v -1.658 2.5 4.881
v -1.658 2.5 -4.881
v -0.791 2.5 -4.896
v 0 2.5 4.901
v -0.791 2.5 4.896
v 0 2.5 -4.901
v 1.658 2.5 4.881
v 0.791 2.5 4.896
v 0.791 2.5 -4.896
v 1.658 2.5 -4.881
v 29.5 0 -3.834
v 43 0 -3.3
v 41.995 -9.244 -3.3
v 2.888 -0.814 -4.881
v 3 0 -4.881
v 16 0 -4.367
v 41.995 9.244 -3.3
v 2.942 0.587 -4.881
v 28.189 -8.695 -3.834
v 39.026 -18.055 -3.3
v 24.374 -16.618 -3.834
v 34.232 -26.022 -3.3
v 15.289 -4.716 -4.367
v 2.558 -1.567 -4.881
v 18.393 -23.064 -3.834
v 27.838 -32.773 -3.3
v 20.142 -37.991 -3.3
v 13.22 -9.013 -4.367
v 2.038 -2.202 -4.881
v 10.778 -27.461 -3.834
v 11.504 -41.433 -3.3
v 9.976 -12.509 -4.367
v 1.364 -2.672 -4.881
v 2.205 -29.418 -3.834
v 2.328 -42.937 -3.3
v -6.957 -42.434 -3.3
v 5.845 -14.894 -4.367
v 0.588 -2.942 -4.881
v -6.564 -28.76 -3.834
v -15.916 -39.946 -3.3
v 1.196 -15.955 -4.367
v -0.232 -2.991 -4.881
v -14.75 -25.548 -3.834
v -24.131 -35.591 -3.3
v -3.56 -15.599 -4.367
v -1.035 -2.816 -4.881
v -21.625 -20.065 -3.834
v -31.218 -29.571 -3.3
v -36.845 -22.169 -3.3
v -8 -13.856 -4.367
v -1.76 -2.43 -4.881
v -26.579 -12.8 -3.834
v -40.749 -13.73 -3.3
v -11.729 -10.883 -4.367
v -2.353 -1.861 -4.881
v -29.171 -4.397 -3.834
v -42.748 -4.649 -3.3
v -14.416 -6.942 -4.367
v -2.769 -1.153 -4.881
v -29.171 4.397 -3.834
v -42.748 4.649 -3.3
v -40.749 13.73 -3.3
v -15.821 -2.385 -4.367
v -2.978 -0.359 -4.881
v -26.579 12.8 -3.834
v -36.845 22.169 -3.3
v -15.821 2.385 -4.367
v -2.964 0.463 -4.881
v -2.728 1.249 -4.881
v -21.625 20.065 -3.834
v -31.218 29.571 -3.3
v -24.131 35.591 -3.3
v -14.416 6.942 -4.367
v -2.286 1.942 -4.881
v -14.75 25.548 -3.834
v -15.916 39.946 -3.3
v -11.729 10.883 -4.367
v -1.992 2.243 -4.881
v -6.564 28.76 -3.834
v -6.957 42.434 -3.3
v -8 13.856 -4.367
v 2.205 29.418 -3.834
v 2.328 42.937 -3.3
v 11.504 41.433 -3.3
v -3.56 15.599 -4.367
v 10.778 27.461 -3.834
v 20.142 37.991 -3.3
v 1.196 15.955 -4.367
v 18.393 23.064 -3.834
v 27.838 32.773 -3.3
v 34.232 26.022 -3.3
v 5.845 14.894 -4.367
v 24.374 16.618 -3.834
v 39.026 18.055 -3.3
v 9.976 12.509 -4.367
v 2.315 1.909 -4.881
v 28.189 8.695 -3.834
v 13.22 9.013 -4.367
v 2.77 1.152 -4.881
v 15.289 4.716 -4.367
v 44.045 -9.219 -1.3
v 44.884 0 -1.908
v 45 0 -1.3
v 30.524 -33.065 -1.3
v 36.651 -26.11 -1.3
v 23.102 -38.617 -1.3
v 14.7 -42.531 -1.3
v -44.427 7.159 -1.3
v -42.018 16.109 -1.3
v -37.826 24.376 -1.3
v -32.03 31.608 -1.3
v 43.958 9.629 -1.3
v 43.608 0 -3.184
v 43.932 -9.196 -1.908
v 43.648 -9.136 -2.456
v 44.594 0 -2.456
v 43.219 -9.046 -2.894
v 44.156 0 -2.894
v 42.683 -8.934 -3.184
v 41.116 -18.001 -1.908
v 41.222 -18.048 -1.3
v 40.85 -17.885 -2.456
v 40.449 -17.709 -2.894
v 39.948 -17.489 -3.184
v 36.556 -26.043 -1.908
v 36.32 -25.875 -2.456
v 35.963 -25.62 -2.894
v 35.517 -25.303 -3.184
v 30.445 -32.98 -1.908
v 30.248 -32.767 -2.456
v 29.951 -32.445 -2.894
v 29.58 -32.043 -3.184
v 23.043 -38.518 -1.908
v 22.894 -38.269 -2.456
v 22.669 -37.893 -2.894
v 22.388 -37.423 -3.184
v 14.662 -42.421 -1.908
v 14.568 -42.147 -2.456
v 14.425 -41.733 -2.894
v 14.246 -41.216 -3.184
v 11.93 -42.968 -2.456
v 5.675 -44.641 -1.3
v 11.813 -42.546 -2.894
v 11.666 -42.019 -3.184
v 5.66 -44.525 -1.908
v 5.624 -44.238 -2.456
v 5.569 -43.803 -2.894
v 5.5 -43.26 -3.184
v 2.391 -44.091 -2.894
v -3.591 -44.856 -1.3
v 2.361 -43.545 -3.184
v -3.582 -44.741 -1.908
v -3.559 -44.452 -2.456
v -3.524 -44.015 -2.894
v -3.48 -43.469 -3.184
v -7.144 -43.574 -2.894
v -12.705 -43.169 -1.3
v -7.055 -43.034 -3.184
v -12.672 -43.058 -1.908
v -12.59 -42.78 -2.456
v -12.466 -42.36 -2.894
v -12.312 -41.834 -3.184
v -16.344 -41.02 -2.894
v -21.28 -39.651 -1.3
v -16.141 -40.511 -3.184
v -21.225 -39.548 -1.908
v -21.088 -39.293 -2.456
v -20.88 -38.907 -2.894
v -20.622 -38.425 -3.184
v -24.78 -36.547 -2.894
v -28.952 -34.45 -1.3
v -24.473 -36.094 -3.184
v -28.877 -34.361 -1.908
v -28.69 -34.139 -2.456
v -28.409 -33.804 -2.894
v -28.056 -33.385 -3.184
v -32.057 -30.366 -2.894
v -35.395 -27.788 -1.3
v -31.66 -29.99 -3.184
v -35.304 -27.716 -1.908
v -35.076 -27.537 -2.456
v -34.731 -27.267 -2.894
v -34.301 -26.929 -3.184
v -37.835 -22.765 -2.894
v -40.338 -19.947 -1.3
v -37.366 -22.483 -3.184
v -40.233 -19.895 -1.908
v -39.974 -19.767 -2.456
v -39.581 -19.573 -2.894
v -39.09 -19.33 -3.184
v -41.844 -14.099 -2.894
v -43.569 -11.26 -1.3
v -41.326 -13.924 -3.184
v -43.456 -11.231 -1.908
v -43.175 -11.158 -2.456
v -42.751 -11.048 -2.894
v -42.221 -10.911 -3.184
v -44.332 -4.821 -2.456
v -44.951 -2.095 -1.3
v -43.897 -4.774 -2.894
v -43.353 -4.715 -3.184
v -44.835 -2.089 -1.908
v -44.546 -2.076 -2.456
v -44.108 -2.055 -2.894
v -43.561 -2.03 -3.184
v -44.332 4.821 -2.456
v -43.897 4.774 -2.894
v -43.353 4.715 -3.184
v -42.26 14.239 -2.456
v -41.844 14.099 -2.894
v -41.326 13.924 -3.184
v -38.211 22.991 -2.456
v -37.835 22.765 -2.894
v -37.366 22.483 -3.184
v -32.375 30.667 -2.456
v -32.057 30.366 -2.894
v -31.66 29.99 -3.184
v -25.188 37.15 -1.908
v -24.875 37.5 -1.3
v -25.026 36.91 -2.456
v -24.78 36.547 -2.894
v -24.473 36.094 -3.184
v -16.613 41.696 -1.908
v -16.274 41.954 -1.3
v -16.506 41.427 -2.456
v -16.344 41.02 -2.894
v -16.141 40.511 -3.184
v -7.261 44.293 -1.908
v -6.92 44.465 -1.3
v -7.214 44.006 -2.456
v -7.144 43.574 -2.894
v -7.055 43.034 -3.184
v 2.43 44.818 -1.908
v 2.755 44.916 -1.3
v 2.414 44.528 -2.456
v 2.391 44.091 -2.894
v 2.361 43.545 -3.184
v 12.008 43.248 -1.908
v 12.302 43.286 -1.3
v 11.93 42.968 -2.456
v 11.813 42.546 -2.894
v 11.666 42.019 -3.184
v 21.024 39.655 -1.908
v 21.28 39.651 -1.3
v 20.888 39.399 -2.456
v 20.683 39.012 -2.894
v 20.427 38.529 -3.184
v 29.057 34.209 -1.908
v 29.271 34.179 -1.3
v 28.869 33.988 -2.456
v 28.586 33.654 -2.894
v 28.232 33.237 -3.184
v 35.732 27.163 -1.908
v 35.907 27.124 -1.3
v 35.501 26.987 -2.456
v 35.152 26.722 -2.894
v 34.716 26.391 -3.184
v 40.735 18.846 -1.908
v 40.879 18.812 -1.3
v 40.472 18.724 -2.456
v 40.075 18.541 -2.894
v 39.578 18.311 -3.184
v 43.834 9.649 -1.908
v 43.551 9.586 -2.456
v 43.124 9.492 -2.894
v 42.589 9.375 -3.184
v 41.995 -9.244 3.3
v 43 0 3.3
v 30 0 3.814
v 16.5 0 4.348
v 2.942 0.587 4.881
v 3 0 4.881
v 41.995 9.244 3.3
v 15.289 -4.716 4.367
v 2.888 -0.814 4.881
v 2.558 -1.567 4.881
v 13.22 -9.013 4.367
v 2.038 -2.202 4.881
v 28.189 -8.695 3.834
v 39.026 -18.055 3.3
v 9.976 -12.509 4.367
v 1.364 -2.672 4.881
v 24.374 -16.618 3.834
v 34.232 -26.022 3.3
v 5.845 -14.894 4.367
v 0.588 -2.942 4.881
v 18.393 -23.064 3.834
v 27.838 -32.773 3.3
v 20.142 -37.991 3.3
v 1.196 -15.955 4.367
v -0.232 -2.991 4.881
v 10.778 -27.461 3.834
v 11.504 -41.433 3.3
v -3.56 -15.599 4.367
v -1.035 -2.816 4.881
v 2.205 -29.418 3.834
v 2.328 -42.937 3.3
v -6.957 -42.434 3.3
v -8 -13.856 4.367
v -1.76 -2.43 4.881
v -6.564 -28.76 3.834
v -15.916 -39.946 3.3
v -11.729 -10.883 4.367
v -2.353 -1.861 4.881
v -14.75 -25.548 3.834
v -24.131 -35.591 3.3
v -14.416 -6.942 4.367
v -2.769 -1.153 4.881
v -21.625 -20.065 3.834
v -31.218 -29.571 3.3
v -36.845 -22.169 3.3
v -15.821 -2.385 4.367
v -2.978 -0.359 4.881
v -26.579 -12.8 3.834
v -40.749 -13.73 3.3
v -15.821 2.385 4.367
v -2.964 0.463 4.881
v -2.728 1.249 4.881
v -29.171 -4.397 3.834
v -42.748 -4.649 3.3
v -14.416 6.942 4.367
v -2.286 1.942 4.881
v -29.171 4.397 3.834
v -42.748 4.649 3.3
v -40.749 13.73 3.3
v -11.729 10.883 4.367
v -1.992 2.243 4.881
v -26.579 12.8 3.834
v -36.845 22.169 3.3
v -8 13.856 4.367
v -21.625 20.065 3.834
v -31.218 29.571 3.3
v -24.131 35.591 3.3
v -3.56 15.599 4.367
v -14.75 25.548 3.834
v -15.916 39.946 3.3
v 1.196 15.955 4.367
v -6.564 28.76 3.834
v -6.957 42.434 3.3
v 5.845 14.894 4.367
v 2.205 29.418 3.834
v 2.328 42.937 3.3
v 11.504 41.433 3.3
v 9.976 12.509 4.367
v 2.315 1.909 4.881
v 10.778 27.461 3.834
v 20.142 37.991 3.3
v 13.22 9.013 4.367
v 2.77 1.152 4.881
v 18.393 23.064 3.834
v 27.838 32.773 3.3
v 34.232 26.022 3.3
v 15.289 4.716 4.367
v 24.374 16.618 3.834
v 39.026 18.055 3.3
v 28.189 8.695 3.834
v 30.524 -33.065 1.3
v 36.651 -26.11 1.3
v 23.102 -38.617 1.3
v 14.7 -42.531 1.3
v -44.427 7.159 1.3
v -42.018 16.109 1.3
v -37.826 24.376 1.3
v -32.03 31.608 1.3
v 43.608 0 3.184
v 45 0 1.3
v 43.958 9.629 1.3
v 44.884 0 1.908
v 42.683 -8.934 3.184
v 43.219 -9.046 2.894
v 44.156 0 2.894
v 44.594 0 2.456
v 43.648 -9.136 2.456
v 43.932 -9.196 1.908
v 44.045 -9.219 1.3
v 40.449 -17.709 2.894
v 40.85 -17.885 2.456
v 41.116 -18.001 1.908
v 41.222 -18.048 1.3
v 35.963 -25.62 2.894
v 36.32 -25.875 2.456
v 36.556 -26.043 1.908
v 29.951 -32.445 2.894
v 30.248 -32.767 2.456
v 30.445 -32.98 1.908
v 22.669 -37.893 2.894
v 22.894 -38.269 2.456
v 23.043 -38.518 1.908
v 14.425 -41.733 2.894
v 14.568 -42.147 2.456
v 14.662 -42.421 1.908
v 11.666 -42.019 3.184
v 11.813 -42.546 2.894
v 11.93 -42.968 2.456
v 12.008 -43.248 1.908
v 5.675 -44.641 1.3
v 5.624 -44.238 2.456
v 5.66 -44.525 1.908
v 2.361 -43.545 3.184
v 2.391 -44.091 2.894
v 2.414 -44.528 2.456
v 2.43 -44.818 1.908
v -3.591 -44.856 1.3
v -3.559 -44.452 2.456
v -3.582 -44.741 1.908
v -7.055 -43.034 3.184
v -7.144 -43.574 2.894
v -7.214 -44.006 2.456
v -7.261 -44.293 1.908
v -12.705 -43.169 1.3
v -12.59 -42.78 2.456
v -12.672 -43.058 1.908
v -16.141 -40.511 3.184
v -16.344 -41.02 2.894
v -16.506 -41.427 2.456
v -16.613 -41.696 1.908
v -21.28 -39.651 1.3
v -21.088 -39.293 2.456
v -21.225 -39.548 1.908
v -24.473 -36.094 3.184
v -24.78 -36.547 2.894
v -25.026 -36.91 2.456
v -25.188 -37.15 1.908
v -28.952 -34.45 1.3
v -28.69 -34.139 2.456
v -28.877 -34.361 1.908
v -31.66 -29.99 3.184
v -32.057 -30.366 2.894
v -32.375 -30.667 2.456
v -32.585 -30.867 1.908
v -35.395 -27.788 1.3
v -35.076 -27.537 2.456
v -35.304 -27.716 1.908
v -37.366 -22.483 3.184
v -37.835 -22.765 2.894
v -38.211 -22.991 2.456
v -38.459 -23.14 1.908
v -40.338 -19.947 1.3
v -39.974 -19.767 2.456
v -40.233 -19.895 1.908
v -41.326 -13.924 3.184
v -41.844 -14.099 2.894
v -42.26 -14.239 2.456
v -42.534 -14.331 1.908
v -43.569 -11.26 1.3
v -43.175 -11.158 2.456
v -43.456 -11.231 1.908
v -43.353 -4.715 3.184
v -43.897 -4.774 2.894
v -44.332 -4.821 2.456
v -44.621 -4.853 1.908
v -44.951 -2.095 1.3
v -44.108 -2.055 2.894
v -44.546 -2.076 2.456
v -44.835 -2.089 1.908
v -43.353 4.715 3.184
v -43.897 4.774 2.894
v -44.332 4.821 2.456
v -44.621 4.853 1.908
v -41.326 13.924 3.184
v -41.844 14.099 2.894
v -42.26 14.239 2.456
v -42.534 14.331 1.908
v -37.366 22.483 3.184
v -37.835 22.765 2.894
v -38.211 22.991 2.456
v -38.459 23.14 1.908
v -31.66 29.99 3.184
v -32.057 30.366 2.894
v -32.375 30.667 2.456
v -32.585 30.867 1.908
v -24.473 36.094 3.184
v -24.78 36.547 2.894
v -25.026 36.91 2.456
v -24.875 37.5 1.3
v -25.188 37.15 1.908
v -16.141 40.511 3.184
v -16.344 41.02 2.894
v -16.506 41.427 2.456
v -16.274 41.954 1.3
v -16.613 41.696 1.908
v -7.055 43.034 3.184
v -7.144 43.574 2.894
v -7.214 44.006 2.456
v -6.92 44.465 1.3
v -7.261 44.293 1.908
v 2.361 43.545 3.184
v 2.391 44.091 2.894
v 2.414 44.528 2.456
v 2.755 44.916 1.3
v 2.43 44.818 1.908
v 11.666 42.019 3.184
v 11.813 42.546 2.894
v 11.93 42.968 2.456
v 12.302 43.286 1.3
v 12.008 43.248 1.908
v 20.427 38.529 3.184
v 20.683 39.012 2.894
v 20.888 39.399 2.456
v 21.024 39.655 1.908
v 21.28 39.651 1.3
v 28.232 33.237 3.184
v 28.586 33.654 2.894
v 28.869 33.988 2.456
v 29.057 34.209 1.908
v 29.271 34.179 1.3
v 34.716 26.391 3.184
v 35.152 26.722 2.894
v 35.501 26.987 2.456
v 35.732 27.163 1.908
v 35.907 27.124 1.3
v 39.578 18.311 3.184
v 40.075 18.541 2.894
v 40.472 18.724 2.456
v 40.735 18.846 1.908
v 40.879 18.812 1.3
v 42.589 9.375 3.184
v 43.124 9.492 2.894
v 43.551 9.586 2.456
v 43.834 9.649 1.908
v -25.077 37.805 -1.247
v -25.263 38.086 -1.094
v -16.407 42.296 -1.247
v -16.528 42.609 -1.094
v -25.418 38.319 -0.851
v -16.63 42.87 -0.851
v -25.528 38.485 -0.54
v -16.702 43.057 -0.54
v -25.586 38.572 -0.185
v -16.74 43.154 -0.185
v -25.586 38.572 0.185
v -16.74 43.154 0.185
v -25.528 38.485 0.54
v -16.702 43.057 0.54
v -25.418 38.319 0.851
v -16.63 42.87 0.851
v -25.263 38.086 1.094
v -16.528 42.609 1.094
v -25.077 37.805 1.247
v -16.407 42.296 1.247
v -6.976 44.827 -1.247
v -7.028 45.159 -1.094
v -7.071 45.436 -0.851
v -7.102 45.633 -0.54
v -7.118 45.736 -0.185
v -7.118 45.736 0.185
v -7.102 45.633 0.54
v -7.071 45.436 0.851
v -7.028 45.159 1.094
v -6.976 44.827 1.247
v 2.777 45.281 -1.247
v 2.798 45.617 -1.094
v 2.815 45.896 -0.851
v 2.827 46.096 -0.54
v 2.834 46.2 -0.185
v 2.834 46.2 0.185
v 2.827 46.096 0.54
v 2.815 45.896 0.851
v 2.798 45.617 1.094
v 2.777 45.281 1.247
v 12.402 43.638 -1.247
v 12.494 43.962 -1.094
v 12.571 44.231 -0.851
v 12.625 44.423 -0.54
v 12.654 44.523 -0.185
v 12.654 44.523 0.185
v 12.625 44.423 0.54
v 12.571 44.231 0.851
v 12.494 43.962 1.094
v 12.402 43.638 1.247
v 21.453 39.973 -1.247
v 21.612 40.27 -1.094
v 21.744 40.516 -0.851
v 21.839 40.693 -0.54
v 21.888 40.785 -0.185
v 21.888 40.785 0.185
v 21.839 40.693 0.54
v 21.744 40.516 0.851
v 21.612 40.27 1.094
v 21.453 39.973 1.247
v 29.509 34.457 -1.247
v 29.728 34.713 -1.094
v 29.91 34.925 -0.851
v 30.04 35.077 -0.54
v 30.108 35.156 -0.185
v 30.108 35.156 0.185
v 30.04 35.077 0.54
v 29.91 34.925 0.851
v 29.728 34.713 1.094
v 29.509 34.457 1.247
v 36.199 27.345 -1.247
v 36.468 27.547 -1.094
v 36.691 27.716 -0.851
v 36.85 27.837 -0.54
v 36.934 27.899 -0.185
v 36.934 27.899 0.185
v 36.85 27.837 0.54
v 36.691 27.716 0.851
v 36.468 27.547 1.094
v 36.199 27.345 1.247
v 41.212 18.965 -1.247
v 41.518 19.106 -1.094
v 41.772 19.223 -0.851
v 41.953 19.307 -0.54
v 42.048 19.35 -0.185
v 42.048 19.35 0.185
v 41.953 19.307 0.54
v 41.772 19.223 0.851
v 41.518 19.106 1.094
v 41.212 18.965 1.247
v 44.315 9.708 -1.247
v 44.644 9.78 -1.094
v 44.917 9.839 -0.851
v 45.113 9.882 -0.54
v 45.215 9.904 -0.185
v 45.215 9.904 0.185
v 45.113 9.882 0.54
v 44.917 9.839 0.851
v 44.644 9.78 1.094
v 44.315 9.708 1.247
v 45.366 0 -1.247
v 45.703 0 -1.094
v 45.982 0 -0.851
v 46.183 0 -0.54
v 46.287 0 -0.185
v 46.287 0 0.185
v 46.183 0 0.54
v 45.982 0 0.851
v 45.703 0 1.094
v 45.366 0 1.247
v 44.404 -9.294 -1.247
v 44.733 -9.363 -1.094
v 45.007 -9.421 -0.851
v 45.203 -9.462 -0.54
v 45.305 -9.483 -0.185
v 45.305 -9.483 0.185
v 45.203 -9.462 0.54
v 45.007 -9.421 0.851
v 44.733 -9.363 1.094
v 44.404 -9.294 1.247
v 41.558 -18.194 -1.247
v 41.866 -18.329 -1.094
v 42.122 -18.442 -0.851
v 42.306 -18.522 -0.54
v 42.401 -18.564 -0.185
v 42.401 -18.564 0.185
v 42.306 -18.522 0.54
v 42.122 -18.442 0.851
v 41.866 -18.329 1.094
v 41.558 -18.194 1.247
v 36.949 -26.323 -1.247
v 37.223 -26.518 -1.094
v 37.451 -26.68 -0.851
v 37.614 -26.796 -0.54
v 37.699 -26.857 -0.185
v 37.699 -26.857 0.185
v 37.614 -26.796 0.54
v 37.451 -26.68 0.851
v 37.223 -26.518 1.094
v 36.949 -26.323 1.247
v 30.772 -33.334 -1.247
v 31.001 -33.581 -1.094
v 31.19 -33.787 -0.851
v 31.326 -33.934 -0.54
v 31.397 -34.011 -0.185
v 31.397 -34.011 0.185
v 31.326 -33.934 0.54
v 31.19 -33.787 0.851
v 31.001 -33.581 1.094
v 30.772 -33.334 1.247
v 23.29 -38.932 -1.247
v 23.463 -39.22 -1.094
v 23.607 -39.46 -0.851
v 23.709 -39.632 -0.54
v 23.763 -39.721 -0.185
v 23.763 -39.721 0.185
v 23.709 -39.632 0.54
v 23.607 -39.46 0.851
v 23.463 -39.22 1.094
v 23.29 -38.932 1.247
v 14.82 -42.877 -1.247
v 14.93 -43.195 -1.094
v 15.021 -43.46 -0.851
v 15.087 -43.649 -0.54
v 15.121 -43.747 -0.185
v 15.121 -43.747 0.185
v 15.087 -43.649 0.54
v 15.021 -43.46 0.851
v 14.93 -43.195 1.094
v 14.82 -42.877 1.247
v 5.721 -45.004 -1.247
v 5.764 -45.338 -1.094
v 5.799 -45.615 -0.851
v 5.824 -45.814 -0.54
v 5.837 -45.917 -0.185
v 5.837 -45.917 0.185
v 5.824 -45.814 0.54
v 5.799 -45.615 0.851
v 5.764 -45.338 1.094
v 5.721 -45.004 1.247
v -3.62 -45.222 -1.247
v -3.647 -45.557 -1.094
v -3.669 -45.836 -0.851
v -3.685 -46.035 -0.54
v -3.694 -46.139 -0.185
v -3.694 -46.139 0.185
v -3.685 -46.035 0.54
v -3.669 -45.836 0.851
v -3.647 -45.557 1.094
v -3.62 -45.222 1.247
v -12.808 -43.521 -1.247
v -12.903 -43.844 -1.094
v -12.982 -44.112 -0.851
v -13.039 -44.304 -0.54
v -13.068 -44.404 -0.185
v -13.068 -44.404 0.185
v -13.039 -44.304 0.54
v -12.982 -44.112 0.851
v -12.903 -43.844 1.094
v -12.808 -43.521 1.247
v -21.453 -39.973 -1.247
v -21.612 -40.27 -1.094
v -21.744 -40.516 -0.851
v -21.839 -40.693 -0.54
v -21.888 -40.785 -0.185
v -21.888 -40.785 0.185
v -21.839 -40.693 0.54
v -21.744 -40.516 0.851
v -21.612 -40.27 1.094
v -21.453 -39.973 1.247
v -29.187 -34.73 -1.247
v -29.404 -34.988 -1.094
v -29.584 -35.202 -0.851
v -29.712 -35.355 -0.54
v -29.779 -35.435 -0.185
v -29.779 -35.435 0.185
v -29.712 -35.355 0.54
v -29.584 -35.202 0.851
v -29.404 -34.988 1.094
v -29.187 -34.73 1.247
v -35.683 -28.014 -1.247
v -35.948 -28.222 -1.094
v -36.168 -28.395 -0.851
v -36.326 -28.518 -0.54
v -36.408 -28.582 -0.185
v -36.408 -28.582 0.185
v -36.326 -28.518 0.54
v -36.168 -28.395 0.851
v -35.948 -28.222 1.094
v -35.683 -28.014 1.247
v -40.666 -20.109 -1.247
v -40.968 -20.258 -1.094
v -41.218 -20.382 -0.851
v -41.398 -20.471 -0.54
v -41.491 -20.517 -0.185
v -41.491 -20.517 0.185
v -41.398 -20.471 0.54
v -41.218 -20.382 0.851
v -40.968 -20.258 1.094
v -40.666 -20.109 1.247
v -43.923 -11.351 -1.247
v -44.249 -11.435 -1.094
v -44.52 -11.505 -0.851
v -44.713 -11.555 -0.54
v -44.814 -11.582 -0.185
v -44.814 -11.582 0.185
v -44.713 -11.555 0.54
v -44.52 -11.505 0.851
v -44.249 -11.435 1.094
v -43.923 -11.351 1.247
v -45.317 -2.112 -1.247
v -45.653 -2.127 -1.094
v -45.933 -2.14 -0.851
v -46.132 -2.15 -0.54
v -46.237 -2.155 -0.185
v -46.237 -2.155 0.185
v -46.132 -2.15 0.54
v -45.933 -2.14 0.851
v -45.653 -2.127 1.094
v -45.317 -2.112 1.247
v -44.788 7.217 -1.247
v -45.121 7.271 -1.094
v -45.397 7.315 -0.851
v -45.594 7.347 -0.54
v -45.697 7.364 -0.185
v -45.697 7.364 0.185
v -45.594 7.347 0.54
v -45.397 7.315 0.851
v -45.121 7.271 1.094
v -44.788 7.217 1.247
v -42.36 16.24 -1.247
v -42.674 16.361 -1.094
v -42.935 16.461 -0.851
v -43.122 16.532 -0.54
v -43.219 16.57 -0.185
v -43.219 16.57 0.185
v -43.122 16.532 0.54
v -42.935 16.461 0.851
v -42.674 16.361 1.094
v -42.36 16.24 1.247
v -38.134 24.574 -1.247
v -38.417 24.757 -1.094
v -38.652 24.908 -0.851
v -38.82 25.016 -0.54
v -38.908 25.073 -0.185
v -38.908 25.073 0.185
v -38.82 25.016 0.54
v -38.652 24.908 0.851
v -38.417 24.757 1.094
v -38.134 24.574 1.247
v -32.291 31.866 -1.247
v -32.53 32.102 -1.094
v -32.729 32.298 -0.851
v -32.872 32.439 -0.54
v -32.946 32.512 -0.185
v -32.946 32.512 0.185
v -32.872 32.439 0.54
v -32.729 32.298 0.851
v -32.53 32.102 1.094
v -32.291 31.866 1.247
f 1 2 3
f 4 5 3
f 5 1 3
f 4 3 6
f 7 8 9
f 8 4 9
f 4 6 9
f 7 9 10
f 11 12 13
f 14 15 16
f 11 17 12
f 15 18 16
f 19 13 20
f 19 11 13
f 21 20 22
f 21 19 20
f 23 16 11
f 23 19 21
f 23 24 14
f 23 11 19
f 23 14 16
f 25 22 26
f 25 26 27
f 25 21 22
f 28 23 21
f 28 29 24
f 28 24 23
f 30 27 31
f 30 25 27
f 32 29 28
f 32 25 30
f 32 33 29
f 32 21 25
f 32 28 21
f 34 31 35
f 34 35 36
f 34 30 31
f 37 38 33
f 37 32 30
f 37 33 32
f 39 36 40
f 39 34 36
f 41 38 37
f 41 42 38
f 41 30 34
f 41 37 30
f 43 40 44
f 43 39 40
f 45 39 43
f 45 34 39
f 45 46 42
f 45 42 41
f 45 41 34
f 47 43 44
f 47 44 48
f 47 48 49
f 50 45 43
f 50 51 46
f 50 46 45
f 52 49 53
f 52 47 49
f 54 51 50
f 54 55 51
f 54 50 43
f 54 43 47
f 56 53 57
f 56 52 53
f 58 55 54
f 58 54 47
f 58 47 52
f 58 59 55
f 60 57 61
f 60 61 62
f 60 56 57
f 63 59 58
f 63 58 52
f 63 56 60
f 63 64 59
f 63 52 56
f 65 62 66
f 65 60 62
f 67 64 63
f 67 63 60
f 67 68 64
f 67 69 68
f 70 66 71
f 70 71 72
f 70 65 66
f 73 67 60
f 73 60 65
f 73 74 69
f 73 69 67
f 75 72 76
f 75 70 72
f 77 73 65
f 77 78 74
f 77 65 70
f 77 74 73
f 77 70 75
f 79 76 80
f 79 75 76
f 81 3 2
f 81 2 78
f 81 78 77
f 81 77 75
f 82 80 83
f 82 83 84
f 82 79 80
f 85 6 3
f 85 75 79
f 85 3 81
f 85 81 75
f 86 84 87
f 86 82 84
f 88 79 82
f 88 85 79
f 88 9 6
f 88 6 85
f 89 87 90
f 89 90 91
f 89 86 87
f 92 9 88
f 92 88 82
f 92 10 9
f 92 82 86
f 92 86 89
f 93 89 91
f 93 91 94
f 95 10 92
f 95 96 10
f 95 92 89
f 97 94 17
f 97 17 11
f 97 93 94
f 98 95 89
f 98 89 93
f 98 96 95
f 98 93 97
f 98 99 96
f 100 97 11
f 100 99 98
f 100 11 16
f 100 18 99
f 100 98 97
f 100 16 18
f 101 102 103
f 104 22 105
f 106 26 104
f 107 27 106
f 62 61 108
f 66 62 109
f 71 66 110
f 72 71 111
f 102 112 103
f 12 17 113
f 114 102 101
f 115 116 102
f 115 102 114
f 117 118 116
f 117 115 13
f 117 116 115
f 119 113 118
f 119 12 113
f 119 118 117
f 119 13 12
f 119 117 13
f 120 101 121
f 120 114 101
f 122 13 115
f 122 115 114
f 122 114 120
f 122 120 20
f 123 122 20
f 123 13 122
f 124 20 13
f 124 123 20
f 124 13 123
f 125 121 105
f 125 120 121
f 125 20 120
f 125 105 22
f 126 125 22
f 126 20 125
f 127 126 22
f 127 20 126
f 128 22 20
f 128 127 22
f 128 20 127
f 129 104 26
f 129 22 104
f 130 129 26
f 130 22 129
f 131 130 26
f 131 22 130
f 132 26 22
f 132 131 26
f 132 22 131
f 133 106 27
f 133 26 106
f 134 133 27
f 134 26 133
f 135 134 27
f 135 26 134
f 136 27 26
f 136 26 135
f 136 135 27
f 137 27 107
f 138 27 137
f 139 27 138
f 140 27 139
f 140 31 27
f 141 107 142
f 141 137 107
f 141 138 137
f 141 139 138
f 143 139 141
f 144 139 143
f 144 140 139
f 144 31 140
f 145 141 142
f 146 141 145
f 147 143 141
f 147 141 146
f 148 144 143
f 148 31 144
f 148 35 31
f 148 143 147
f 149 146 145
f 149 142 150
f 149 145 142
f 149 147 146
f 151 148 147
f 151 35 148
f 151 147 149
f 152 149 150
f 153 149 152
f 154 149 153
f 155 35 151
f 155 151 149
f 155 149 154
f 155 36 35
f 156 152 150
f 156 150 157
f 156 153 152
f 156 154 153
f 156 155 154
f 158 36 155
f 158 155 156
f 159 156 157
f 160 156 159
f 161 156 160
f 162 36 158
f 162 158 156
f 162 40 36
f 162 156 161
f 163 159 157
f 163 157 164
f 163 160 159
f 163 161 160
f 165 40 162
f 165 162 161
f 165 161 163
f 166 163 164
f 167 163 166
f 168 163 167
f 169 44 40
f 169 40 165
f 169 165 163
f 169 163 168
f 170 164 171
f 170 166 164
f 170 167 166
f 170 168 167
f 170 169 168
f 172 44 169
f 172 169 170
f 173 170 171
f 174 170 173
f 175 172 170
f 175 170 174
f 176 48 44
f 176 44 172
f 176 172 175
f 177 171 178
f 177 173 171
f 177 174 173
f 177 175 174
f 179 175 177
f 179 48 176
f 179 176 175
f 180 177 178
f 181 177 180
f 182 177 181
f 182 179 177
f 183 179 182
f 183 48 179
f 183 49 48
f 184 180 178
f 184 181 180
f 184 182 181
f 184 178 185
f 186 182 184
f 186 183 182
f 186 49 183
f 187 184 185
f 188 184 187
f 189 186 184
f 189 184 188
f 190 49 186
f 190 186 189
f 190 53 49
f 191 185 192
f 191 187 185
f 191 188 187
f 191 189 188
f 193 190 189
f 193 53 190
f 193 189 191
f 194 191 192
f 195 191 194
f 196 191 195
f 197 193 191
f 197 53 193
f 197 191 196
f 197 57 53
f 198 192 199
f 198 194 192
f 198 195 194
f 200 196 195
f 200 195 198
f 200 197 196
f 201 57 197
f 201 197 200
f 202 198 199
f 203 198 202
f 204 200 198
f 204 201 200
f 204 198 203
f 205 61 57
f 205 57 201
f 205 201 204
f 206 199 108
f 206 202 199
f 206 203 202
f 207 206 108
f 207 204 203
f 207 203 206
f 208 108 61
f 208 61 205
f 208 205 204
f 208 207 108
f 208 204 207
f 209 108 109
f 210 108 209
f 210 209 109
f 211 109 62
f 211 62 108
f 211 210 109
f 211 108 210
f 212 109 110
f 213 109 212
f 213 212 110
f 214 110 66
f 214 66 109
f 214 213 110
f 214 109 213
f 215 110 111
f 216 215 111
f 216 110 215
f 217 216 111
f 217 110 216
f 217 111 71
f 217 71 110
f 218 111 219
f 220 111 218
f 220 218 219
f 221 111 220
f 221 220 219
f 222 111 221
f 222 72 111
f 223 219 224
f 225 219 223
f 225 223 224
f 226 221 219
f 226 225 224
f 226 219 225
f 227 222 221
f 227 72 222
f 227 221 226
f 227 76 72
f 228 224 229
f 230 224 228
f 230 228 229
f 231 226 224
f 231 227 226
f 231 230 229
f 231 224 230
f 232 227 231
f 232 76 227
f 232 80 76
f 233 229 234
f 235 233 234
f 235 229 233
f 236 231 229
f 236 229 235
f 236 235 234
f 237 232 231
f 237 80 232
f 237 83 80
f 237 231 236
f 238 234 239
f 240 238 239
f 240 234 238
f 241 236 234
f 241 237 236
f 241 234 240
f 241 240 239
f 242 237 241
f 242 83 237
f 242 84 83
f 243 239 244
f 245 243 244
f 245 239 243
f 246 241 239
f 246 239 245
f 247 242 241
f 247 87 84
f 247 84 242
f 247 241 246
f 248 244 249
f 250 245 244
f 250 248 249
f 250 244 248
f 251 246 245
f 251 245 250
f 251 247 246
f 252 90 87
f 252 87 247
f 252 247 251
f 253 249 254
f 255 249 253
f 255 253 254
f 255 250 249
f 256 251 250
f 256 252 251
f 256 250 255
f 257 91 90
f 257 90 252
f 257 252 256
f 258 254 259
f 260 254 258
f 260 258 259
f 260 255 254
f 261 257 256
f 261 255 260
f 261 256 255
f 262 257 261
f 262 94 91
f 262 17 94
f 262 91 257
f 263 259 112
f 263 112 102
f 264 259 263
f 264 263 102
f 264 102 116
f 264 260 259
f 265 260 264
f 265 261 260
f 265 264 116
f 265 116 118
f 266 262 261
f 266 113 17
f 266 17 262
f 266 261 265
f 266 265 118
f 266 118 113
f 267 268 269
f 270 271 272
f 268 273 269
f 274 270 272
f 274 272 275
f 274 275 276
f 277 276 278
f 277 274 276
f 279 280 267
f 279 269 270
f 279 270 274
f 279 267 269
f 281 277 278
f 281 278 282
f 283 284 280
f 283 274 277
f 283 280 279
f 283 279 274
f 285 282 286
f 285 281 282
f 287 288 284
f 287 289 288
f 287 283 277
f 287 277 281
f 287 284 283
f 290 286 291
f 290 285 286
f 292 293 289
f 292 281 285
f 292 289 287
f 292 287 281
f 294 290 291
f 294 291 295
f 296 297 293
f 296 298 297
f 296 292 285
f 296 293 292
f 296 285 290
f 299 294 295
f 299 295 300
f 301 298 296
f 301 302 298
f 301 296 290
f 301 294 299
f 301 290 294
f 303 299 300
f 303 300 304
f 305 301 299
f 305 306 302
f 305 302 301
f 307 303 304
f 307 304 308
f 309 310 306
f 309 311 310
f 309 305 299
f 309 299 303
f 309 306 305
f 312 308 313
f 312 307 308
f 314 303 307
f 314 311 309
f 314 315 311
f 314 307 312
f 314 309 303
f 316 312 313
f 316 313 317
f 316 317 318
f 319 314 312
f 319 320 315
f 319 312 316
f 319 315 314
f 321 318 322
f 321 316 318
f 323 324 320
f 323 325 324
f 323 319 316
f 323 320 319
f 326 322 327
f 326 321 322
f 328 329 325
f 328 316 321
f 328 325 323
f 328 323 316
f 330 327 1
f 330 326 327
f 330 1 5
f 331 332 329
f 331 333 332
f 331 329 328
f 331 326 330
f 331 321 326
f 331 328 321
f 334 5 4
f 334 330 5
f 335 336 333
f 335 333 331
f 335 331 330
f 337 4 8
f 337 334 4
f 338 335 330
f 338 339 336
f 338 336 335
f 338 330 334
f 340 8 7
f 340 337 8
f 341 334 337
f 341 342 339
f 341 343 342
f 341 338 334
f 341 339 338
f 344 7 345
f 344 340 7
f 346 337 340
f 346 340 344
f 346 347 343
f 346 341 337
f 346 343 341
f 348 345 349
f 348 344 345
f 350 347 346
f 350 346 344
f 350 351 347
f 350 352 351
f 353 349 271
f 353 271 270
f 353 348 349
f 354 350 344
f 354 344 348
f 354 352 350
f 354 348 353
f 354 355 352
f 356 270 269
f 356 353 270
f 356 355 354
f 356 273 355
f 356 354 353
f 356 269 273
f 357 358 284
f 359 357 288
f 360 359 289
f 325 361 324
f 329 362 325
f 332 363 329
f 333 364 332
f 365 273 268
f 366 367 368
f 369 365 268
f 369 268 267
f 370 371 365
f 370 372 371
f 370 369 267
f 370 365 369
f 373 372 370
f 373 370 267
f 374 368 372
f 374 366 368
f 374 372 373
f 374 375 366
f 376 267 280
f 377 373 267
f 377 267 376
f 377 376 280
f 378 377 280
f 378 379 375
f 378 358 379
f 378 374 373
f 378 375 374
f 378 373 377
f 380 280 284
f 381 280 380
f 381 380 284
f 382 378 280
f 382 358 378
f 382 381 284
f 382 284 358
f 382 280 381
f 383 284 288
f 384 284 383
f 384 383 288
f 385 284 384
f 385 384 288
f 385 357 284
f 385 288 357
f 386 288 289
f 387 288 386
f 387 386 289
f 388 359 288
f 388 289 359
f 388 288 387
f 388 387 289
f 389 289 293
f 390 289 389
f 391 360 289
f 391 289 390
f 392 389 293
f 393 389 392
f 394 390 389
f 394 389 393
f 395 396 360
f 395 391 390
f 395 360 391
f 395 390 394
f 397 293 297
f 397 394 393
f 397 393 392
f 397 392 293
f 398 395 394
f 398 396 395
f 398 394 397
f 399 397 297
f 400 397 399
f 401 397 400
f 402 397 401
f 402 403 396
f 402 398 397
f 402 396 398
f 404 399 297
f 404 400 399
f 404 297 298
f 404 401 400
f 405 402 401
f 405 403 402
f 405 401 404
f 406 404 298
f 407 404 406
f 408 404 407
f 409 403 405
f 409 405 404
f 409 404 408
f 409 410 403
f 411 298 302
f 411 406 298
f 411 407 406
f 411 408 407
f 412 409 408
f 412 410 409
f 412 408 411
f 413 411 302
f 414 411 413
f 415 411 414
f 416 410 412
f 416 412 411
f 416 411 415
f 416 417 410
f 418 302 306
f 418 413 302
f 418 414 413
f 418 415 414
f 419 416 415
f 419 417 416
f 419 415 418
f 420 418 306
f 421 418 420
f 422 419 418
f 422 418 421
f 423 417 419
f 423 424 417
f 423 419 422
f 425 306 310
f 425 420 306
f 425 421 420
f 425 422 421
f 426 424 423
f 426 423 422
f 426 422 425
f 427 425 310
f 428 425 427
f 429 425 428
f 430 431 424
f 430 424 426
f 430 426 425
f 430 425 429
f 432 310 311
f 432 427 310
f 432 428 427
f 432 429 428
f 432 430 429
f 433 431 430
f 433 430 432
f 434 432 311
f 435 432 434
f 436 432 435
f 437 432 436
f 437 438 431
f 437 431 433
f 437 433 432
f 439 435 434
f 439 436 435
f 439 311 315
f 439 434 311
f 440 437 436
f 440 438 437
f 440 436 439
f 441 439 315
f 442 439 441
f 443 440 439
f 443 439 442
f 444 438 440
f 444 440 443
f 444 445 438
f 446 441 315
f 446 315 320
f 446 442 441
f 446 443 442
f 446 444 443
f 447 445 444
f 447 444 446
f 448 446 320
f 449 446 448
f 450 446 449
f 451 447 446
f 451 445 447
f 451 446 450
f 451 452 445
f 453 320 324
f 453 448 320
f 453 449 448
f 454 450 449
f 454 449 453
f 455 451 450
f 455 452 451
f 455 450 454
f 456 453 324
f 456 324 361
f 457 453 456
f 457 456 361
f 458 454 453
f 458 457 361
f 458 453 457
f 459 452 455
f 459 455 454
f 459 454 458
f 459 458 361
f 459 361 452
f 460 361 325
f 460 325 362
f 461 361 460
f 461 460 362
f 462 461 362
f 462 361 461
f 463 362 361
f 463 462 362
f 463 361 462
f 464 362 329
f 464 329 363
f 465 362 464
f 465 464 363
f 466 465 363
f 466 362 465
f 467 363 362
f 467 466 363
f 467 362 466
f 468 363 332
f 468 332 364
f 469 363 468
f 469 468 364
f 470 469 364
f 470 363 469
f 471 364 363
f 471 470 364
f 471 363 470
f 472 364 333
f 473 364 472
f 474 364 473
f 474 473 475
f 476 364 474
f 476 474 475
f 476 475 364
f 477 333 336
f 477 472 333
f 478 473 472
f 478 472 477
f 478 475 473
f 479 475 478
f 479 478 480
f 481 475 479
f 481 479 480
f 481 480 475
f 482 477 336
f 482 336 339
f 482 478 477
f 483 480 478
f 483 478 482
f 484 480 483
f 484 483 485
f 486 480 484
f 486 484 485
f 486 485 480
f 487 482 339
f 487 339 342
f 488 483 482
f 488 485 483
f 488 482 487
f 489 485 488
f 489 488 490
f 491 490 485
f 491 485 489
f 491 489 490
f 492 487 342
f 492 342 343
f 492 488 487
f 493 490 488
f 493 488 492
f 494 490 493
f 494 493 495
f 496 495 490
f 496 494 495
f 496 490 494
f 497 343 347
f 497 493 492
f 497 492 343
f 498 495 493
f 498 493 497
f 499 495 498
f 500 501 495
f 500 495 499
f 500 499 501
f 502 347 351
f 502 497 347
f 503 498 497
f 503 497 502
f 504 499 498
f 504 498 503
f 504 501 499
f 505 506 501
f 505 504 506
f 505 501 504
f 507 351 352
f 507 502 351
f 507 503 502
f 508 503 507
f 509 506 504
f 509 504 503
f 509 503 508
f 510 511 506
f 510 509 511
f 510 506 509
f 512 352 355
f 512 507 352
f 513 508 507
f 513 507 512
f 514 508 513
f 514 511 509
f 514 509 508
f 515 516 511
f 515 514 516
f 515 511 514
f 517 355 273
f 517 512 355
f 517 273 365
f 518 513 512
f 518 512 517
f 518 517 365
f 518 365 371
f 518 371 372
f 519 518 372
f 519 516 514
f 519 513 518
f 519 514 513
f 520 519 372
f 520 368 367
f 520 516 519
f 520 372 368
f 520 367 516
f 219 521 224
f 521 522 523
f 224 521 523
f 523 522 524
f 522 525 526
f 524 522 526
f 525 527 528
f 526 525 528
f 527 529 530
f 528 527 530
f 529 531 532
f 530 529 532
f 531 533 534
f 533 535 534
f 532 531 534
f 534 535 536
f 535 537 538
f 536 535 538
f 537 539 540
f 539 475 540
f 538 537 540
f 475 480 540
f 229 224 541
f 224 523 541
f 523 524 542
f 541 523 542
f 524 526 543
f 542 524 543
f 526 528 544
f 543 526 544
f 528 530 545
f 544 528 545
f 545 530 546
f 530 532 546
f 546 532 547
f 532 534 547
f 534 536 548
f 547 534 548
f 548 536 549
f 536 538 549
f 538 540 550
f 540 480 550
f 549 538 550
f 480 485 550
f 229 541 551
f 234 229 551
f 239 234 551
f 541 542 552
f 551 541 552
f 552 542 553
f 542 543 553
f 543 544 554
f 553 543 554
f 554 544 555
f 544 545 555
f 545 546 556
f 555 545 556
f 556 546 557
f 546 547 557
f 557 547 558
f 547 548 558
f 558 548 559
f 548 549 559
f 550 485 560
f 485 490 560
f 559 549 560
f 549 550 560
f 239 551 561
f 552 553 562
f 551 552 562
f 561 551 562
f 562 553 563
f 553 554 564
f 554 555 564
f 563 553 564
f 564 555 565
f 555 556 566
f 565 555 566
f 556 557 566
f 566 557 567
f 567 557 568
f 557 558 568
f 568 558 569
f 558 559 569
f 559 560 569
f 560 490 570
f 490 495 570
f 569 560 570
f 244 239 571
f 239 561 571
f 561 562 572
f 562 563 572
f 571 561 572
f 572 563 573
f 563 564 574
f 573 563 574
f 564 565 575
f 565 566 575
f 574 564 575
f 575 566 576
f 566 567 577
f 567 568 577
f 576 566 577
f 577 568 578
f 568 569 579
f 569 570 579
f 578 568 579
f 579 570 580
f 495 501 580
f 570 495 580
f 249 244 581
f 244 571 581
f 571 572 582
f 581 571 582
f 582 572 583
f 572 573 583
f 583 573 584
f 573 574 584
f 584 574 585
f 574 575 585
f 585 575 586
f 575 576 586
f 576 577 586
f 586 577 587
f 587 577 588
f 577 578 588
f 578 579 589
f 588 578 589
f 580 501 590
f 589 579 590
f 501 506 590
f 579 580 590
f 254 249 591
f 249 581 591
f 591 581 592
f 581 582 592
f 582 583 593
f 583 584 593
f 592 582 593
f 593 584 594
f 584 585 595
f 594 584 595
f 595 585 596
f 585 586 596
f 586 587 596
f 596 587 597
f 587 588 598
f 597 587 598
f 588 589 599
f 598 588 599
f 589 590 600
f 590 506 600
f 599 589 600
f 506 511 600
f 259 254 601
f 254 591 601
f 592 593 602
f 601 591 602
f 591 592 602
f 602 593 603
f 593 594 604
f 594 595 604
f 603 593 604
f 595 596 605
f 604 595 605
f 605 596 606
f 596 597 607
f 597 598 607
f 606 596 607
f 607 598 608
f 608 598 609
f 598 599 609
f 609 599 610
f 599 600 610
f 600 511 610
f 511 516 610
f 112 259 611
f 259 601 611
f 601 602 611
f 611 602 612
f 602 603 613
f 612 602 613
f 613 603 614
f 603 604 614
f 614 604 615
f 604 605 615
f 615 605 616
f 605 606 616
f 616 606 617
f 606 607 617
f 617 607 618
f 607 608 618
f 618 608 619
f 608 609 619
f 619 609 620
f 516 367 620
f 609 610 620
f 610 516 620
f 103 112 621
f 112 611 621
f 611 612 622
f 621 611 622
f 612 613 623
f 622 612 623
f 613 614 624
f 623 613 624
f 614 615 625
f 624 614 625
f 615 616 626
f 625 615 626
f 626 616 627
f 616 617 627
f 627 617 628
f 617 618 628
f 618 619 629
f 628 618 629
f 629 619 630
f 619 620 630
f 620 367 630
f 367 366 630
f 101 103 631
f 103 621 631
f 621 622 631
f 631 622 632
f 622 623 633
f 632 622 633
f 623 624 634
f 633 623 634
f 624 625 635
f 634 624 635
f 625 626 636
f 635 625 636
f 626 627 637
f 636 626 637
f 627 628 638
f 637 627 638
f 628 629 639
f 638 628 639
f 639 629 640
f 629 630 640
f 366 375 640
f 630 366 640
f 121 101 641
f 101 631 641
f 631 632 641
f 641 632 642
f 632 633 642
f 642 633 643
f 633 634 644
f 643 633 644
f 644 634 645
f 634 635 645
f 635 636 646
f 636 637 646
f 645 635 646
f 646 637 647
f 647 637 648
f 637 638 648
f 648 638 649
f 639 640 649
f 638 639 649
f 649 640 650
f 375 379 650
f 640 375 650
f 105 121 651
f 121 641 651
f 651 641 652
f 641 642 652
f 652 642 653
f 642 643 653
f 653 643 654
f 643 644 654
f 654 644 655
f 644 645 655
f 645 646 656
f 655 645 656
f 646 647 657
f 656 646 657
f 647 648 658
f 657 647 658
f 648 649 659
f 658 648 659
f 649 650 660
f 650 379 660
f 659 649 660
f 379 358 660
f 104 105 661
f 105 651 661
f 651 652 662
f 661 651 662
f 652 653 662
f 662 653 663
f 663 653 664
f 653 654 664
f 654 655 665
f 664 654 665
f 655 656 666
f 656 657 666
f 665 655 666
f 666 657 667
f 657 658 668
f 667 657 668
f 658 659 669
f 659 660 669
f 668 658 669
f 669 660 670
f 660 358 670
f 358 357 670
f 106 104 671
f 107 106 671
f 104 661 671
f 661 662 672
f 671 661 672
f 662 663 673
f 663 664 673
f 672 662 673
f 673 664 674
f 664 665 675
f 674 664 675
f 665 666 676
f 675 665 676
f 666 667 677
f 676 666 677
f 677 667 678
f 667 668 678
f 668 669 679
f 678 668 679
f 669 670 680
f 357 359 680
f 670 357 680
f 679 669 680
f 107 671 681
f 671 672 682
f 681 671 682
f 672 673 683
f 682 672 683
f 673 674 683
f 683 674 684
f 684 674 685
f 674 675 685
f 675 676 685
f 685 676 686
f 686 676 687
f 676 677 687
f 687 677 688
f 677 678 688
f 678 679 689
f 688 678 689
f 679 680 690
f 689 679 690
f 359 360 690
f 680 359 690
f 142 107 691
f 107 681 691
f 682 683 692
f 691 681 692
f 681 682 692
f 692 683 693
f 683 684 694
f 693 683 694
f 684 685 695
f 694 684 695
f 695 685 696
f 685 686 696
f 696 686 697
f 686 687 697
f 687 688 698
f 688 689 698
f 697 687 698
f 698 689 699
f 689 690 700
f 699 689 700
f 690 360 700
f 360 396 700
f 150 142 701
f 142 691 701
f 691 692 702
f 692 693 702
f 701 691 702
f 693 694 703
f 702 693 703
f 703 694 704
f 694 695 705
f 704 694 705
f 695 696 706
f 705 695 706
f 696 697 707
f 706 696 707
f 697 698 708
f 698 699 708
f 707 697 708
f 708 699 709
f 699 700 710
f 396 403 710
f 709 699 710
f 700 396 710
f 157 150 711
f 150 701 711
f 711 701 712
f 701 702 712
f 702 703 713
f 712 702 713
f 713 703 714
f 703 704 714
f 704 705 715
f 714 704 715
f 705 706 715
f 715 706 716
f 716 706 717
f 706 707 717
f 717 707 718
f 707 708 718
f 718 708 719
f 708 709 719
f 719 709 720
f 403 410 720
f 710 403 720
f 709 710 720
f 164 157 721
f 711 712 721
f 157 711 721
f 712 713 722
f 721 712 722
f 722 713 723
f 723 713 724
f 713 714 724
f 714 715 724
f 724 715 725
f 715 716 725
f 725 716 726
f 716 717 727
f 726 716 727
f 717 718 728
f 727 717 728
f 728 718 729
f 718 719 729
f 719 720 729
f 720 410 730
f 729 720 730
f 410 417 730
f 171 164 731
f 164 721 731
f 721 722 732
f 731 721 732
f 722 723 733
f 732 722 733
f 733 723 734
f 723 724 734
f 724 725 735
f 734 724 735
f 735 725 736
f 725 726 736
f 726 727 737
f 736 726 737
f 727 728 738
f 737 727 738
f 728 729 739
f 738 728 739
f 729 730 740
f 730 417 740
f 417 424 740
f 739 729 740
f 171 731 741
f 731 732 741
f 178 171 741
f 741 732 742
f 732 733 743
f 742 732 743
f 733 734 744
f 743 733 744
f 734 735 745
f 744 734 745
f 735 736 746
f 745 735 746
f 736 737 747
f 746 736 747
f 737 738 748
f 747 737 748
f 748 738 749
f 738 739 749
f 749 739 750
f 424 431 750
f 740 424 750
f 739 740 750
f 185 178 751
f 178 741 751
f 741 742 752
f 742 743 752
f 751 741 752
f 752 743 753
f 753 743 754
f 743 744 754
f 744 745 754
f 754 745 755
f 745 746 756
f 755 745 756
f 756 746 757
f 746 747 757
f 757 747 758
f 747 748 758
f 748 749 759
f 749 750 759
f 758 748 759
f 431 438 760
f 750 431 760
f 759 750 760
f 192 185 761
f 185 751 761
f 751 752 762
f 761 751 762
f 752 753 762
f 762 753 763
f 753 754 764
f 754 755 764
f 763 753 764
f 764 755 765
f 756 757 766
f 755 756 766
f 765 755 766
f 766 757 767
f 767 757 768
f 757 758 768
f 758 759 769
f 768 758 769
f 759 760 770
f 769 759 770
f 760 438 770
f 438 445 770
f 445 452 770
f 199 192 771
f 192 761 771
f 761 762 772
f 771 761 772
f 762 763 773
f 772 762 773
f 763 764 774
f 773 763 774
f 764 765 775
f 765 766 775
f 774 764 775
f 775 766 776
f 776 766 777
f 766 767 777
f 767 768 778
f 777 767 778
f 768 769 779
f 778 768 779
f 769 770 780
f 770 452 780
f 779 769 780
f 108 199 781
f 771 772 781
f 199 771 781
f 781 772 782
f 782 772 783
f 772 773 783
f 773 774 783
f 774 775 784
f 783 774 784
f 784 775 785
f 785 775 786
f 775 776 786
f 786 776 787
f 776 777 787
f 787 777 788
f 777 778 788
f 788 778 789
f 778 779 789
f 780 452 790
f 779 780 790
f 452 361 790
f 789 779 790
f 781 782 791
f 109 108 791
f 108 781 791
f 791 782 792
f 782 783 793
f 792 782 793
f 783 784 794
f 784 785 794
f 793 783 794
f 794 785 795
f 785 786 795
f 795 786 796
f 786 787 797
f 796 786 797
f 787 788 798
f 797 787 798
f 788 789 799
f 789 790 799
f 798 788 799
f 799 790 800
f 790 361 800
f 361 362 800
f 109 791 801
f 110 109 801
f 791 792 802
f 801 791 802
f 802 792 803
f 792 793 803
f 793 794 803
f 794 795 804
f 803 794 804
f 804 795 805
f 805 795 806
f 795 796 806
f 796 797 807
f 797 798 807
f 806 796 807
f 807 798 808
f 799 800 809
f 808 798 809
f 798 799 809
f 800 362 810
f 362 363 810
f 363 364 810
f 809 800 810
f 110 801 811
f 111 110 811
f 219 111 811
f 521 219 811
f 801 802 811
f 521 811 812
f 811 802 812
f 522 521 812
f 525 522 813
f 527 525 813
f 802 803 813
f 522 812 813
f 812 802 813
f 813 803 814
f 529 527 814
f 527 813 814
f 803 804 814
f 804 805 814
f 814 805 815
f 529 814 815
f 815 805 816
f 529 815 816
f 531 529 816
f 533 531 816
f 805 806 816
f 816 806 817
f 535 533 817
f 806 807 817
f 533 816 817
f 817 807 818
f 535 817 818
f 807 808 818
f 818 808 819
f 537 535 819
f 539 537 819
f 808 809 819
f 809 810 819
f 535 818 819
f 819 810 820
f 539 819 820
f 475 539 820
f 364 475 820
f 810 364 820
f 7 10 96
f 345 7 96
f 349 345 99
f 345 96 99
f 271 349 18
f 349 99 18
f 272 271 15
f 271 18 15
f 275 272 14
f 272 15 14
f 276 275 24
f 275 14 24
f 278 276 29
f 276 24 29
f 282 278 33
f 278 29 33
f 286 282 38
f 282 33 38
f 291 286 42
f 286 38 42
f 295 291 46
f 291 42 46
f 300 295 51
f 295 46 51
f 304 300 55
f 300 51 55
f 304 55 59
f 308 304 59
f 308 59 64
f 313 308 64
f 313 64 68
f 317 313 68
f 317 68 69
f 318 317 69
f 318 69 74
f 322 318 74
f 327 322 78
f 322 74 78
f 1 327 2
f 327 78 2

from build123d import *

# Parameters (mm, degrees)
ENL_V_MAT_EXTRU_3_DEPTH      = 64.835726674
ENL_V_MAT_EXTRU_3_DEPTH_BACK = 64.835726674
ESQUISSE4_R                  = 1.3


with BuildPart() as part:
    # Esquisse2 → Révolution1 (revolve)
    with BuildSketch(Plane(origin=(0, 0, 0), x_dir=(0, 0, -1), z_dir=(1, 0, 0)), mode=Mode.PRIVATE) as r_volution1_sk:
        with BuildLine():
            Line((5, 0), (-5, 0))
            Line((-5, 0), (-3.3, 43))
            ThreePointArc((-3.3, 43), (-2.691251544, 44.391251544), (-1.3, 45))
            ThreePointArc((-1.3, 45), (0, 43.7), (1.3, 45))
            ThreePointArc((1.3, 45), (2.691251544, 44.391251544), (3.3, 43))
            Line((3.3, 43), (5, 0))
        make_face()
    revolve(r_volution1_sk.sketch.rotate(Axis((0, 0, 77.254476924), (0, 0, -1)), 90), axis=Axis((0, 0, 77.254476924), (0, 0, -1)))

    # Esquisse3 → Enlèv. mat.-Extru.3 (cut, two sides: drawn at the far end of the back side and taken through both)
    with BuildSketch(Plane.XY.offset(-ENL_V_MAT_EXTRU_3_DEPTH_BACK)):
        with BuildLine():
            Line((-1.658312395, 2.5), (1.658312395, 2.5))
            ThreePointArc((1.658312395, 2.5), (0, -3), (-1.658312395, 2.5))
        make_face()
    extrude(amount=ENL_V_MAT_EXTRU_3_DEPTH + ENL_V_MAT_EXTRU_3_DEPTH_BACK, mode=Mode.SUBTRACT)

    # Esquisse4 → Révolution2 (revolve)
    with BuildSketch(Plane(origin=(0, 0, 0), x_dir=(0, 0, -1), z_dir=(1, 0, 0)), mode=Mode.PRIVATE) as r_volution2_sk:
        with Locations((0, 45)):
            Circle(ESQUISSE4_R)
    revolve(r_volution2_sk.sketch.rotate(Axis((0, 0, 0), (0, 0, -1)), 326.442690238), axis=Axis((0, 0, 0), (0, 0, -1)))


solid = part.part
